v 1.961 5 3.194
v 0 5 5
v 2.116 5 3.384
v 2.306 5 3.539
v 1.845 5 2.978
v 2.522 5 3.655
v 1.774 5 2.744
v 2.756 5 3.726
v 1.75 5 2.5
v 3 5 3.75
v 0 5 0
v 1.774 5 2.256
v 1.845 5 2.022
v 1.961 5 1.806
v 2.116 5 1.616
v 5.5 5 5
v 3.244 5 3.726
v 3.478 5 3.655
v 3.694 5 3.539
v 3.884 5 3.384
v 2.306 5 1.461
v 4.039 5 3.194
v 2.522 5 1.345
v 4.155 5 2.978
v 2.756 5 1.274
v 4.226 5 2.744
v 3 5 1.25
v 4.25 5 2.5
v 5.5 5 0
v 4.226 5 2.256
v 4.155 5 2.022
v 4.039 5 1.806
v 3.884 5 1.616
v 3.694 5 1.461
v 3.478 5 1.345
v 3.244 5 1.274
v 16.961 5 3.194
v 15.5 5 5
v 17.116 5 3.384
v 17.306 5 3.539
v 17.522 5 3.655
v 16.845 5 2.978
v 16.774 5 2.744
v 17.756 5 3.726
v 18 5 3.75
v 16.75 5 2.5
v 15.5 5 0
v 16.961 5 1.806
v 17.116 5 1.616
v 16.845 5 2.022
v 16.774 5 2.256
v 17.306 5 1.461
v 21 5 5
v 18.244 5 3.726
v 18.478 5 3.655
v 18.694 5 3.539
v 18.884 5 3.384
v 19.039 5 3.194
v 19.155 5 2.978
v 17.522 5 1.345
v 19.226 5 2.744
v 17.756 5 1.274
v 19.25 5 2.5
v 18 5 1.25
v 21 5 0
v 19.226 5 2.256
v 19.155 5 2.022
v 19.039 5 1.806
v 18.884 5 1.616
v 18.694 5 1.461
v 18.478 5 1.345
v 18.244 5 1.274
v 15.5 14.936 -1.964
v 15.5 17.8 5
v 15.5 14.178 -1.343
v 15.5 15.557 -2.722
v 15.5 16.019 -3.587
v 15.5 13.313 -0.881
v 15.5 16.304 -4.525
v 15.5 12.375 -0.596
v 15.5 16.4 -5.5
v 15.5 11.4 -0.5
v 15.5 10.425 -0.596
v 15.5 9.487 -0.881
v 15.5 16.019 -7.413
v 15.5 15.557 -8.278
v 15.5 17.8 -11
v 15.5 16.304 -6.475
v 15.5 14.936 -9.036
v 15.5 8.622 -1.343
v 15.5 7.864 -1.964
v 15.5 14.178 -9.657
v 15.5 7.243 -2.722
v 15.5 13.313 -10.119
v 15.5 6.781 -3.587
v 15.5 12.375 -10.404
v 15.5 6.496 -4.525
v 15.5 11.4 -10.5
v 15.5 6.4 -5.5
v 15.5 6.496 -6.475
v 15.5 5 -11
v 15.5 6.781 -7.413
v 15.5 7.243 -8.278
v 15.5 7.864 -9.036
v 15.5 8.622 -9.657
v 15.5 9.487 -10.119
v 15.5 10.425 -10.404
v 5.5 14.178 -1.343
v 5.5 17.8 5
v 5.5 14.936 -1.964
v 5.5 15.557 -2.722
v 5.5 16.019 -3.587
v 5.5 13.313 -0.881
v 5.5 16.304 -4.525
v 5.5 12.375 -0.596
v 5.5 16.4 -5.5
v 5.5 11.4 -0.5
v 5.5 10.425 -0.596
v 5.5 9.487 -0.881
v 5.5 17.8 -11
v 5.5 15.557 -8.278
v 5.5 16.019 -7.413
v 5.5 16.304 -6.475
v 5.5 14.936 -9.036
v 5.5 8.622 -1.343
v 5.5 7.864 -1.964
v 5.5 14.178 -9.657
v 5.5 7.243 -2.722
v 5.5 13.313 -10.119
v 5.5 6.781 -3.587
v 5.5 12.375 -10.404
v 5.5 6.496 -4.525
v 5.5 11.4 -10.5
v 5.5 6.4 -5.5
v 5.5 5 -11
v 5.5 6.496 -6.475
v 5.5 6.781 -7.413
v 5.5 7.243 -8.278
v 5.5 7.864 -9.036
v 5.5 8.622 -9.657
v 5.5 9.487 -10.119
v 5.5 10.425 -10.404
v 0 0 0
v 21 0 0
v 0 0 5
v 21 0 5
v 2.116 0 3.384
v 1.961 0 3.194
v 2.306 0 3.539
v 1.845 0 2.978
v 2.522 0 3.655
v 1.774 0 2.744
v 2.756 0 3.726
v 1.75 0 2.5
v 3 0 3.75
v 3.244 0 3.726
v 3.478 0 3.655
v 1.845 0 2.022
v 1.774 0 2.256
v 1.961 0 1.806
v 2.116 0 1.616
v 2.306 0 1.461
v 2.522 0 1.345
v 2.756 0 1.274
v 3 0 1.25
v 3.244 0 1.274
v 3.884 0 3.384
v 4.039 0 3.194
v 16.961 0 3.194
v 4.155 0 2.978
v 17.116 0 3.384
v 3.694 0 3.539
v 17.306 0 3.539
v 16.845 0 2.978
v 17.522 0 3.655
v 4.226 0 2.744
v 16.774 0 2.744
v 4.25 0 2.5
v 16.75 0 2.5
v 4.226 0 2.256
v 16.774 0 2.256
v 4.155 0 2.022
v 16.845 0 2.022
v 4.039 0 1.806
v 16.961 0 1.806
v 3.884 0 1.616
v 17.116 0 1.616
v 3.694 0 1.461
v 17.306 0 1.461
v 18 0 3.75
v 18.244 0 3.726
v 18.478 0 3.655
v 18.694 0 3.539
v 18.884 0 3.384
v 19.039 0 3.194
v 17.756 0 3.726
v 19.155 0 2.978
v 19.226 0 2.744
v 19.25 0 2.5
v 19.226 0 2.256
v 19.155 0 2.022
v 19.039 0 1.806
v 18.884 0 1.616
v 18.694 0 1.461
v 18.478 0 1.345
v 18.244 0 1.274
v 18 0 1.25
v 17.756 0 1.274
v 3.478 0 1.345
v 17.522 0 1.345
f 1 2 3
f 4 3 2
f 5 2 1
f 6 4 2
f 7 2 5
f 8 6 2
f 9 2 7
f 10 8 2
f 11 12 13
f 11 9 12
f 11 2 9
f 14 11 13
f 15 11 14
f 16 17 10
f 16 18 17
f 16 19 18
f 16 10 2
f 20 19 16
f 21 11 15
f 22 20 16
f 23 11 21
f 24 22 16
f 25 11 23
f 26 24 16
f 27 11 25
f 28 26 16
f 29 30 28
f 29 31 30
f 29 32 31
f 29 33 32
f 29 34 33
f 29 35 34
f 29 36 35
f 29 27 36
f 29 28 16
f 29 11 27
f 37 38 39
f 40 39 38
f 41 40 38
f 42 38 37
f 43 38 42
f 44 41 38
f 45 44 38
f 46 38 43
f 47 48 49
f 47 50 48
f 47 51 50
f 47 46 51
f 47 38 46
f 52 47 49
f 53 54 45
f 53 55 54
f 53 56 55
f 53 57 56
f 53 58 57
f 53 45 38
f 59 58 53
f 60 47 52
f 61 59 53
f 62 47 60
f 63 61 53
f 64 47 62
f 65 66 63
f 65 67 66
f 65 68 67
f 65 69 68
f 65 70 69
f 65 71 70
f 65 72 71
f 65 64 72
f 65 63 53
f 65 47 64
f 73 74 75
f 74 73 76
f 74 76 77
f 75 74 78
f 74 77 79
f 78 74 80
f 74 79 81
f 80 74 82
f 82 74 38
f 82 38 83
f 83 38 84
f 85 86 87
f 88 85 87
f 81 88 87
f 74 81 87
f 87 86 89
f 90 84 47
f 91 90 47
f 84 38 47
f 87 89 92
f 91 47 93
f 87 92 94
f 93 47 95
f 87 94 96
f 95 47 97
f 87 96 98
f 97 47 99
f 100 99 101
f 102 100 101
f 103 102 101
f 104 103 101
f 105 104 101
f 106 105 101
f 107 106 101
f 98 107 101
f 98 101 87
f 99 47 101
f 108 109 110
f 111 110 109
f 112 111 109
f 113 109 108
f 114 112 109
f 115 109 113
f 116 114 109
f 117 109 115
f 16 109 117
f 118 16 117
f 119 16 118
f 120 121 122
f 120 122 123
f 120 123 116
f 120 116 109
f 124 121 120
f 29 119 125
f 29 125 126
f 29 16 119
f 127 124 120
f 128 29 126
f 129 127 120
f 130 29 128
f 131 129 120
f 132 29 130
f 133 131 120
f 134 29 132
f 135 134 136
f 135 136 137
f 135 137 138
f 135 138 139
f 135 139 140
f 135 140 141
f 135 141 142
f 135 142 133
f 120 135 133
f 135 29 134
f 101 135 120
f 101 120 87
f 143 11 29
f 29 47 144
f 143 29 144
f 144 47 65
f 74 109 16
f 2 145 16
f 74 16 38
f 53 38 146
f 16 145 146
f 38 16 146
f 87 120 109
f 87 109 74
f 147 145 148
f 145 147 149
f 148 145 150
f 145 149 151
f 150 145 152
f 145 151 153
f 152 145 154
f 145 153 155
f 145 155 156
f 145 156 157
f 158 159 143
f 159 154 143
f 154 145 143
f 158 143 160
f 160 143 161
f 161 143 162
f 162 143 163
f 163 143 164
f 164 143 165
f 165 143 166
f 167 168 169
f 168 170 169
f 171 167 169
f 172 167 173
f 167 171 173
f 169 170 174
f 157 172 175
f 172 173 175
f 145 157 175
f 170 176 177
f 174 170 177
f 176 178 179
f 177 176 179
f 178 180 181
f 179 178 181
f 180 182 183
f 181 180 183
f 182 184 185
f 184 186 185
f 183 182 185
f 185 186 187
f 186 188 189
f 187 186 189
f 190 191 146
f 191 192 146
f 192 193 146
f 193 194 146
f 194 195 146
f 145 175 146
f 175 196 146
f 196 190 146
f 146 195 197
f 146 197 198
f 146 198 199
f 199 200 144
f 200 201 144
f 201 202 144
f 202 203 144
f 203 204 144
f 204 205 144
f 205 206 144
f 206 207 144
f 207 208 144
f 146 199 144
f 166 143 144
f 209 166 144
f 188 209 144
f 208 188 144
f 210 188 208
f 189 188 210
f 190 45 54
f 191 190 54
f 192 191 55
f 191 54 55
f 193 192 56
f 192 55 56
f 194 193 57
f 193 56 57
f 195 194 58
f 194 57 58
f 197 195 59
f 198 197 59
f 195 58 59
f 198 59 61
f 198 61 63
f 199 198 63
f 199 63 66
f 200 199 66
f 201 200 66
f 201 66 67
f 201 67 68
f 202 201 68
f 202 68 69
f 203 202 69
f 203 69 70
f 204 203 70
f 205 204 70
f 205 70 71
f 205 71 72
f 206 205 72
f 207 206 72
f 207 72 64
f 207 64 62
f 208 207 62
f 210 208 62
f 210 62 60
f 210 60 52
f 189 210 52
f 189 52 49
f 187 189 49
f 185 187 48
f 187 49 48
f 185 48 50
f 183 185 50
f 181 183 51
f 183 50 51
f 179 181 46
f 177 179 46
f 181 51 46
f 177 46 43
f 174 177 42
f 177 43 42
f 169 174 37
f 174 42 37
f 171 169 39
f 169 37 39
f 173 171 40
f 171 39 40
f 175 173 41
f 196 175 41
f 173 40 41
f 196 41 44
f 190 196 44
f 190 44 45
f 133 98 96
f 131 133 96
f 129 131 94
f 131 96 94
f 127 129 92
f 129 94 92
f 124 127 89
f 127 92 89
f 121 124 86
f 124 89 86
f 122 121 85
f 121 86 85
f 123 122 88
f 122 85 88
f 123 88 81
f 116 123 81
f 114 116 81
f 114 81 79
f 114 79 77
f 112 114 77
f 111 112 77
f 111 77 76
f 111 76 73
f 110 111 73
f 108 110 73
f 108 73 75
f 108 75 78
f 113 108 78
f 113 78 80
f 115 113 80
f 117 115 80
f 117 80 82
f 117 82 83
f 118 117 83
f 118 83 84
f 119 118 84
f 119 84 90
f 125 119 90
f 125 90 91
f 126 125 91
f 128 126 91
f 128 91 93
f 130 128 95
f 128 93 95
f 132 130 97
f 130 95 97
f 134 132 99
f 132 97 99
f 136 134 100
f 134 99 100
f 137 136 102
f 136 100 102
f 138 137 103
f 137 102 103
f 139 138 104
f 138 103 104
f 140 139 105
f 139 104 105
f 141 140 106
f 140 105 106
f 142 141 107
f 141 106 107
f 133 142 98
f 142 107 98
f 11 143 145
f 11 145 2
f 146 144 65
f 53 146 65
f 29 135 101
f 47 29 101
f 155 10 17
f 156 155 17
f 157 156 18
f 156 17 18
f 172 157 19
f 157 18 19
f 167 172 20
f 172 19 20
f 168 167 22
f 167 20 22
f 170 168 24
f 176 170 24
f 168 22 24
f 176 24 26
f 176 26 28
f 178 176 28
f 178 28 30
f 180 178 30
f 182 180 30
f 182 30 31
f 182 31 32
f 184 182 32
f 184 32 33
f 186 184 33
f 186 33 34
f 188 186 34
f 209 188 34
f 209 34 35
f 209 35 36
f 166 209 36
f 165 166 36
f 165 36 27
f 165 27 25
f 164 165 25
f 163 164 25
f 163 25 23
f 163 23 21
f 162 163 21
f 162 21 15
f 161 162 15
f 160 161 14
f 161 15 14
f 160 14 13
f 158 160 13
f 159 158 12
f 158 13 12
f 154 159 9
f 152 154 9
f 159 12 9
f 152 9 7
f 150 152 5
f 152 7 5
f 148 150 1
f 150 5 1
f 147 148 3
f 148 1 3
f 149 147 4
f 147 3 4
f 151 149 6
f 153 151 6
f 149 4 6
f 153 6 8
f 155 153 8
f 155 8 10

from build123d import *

# Parameters (mm, degrees)
SKETCH1_W           = 21
SKETCH1_H           = 5
BOSS_EXTRUDE1_DEPTH = 5
SKETCH2_W           = 10
SKETCH2_H           = 16
BOSS_EXTRUDE2_DEPTH = 12.8
SKETCH3_R           = 1.25
CUT_EXTRUDE1_DEPTH  = 13
SKETCH4_R           = 5
CUT_EXTRUDE2_DEPTH  = 13


with BuildPart() as part:
    # Sketch1 → Boss-Extrude1 (new body)
    with BuildSketch(Plane.XY):
        with Locations((10.5, 2.5)):
            Rectangle(SKETCH1_W, SKETCH1_H)
    extrude(amount=BOSS_EXTRUDE1_DEPTH)

    # Sketch2 → Boss-Extrude2 (add)
    with BuildSketch(Plane(origin=(0, 5, 0), x_dir=(1, 0, 0), z_dir=(0, 1, 0))):
        with Locations((10.5, 3)):
            Rectangle(SKETCH2_W, SKETCH2_H)
    extrude(amount=BOSS_EXTRUDE2_DEPTH)

    # Sketch3 → Cut-Extrude1 (cut)
    with BuildSketch(Plane(origin=(0, 5, 0), x_dir=(1, 0, 0), z_dir=(0, 1, 0))):
        with Locations(Location((3, -2.5, 0), (0, 0, 270))):
            Circle(SKETCH3_R)
        with Locations(Location((18, -2.5, 0), (0, 0, 270))):
            Circle(SKETCH3_R)
    extrude(amount=-CUT_EXTRUDE1_DEPTH, mode=Mode.SUBTRACT)

    # Sketch4 → Cut-Extrude2 (cut)
    with BuildSketch(Plane(origin=(15.5, 0, 0), x_dir=(0, 0, -1), z_dir=(1, 0, 0))):
        with Locations((5.5, 11.4)):
            Circle(SKETCH4_R)
    extrude(amount=-CUT_EXTRUDE2_DEPTH, mode=Mode.SUBTRACT)


solid = part.part
